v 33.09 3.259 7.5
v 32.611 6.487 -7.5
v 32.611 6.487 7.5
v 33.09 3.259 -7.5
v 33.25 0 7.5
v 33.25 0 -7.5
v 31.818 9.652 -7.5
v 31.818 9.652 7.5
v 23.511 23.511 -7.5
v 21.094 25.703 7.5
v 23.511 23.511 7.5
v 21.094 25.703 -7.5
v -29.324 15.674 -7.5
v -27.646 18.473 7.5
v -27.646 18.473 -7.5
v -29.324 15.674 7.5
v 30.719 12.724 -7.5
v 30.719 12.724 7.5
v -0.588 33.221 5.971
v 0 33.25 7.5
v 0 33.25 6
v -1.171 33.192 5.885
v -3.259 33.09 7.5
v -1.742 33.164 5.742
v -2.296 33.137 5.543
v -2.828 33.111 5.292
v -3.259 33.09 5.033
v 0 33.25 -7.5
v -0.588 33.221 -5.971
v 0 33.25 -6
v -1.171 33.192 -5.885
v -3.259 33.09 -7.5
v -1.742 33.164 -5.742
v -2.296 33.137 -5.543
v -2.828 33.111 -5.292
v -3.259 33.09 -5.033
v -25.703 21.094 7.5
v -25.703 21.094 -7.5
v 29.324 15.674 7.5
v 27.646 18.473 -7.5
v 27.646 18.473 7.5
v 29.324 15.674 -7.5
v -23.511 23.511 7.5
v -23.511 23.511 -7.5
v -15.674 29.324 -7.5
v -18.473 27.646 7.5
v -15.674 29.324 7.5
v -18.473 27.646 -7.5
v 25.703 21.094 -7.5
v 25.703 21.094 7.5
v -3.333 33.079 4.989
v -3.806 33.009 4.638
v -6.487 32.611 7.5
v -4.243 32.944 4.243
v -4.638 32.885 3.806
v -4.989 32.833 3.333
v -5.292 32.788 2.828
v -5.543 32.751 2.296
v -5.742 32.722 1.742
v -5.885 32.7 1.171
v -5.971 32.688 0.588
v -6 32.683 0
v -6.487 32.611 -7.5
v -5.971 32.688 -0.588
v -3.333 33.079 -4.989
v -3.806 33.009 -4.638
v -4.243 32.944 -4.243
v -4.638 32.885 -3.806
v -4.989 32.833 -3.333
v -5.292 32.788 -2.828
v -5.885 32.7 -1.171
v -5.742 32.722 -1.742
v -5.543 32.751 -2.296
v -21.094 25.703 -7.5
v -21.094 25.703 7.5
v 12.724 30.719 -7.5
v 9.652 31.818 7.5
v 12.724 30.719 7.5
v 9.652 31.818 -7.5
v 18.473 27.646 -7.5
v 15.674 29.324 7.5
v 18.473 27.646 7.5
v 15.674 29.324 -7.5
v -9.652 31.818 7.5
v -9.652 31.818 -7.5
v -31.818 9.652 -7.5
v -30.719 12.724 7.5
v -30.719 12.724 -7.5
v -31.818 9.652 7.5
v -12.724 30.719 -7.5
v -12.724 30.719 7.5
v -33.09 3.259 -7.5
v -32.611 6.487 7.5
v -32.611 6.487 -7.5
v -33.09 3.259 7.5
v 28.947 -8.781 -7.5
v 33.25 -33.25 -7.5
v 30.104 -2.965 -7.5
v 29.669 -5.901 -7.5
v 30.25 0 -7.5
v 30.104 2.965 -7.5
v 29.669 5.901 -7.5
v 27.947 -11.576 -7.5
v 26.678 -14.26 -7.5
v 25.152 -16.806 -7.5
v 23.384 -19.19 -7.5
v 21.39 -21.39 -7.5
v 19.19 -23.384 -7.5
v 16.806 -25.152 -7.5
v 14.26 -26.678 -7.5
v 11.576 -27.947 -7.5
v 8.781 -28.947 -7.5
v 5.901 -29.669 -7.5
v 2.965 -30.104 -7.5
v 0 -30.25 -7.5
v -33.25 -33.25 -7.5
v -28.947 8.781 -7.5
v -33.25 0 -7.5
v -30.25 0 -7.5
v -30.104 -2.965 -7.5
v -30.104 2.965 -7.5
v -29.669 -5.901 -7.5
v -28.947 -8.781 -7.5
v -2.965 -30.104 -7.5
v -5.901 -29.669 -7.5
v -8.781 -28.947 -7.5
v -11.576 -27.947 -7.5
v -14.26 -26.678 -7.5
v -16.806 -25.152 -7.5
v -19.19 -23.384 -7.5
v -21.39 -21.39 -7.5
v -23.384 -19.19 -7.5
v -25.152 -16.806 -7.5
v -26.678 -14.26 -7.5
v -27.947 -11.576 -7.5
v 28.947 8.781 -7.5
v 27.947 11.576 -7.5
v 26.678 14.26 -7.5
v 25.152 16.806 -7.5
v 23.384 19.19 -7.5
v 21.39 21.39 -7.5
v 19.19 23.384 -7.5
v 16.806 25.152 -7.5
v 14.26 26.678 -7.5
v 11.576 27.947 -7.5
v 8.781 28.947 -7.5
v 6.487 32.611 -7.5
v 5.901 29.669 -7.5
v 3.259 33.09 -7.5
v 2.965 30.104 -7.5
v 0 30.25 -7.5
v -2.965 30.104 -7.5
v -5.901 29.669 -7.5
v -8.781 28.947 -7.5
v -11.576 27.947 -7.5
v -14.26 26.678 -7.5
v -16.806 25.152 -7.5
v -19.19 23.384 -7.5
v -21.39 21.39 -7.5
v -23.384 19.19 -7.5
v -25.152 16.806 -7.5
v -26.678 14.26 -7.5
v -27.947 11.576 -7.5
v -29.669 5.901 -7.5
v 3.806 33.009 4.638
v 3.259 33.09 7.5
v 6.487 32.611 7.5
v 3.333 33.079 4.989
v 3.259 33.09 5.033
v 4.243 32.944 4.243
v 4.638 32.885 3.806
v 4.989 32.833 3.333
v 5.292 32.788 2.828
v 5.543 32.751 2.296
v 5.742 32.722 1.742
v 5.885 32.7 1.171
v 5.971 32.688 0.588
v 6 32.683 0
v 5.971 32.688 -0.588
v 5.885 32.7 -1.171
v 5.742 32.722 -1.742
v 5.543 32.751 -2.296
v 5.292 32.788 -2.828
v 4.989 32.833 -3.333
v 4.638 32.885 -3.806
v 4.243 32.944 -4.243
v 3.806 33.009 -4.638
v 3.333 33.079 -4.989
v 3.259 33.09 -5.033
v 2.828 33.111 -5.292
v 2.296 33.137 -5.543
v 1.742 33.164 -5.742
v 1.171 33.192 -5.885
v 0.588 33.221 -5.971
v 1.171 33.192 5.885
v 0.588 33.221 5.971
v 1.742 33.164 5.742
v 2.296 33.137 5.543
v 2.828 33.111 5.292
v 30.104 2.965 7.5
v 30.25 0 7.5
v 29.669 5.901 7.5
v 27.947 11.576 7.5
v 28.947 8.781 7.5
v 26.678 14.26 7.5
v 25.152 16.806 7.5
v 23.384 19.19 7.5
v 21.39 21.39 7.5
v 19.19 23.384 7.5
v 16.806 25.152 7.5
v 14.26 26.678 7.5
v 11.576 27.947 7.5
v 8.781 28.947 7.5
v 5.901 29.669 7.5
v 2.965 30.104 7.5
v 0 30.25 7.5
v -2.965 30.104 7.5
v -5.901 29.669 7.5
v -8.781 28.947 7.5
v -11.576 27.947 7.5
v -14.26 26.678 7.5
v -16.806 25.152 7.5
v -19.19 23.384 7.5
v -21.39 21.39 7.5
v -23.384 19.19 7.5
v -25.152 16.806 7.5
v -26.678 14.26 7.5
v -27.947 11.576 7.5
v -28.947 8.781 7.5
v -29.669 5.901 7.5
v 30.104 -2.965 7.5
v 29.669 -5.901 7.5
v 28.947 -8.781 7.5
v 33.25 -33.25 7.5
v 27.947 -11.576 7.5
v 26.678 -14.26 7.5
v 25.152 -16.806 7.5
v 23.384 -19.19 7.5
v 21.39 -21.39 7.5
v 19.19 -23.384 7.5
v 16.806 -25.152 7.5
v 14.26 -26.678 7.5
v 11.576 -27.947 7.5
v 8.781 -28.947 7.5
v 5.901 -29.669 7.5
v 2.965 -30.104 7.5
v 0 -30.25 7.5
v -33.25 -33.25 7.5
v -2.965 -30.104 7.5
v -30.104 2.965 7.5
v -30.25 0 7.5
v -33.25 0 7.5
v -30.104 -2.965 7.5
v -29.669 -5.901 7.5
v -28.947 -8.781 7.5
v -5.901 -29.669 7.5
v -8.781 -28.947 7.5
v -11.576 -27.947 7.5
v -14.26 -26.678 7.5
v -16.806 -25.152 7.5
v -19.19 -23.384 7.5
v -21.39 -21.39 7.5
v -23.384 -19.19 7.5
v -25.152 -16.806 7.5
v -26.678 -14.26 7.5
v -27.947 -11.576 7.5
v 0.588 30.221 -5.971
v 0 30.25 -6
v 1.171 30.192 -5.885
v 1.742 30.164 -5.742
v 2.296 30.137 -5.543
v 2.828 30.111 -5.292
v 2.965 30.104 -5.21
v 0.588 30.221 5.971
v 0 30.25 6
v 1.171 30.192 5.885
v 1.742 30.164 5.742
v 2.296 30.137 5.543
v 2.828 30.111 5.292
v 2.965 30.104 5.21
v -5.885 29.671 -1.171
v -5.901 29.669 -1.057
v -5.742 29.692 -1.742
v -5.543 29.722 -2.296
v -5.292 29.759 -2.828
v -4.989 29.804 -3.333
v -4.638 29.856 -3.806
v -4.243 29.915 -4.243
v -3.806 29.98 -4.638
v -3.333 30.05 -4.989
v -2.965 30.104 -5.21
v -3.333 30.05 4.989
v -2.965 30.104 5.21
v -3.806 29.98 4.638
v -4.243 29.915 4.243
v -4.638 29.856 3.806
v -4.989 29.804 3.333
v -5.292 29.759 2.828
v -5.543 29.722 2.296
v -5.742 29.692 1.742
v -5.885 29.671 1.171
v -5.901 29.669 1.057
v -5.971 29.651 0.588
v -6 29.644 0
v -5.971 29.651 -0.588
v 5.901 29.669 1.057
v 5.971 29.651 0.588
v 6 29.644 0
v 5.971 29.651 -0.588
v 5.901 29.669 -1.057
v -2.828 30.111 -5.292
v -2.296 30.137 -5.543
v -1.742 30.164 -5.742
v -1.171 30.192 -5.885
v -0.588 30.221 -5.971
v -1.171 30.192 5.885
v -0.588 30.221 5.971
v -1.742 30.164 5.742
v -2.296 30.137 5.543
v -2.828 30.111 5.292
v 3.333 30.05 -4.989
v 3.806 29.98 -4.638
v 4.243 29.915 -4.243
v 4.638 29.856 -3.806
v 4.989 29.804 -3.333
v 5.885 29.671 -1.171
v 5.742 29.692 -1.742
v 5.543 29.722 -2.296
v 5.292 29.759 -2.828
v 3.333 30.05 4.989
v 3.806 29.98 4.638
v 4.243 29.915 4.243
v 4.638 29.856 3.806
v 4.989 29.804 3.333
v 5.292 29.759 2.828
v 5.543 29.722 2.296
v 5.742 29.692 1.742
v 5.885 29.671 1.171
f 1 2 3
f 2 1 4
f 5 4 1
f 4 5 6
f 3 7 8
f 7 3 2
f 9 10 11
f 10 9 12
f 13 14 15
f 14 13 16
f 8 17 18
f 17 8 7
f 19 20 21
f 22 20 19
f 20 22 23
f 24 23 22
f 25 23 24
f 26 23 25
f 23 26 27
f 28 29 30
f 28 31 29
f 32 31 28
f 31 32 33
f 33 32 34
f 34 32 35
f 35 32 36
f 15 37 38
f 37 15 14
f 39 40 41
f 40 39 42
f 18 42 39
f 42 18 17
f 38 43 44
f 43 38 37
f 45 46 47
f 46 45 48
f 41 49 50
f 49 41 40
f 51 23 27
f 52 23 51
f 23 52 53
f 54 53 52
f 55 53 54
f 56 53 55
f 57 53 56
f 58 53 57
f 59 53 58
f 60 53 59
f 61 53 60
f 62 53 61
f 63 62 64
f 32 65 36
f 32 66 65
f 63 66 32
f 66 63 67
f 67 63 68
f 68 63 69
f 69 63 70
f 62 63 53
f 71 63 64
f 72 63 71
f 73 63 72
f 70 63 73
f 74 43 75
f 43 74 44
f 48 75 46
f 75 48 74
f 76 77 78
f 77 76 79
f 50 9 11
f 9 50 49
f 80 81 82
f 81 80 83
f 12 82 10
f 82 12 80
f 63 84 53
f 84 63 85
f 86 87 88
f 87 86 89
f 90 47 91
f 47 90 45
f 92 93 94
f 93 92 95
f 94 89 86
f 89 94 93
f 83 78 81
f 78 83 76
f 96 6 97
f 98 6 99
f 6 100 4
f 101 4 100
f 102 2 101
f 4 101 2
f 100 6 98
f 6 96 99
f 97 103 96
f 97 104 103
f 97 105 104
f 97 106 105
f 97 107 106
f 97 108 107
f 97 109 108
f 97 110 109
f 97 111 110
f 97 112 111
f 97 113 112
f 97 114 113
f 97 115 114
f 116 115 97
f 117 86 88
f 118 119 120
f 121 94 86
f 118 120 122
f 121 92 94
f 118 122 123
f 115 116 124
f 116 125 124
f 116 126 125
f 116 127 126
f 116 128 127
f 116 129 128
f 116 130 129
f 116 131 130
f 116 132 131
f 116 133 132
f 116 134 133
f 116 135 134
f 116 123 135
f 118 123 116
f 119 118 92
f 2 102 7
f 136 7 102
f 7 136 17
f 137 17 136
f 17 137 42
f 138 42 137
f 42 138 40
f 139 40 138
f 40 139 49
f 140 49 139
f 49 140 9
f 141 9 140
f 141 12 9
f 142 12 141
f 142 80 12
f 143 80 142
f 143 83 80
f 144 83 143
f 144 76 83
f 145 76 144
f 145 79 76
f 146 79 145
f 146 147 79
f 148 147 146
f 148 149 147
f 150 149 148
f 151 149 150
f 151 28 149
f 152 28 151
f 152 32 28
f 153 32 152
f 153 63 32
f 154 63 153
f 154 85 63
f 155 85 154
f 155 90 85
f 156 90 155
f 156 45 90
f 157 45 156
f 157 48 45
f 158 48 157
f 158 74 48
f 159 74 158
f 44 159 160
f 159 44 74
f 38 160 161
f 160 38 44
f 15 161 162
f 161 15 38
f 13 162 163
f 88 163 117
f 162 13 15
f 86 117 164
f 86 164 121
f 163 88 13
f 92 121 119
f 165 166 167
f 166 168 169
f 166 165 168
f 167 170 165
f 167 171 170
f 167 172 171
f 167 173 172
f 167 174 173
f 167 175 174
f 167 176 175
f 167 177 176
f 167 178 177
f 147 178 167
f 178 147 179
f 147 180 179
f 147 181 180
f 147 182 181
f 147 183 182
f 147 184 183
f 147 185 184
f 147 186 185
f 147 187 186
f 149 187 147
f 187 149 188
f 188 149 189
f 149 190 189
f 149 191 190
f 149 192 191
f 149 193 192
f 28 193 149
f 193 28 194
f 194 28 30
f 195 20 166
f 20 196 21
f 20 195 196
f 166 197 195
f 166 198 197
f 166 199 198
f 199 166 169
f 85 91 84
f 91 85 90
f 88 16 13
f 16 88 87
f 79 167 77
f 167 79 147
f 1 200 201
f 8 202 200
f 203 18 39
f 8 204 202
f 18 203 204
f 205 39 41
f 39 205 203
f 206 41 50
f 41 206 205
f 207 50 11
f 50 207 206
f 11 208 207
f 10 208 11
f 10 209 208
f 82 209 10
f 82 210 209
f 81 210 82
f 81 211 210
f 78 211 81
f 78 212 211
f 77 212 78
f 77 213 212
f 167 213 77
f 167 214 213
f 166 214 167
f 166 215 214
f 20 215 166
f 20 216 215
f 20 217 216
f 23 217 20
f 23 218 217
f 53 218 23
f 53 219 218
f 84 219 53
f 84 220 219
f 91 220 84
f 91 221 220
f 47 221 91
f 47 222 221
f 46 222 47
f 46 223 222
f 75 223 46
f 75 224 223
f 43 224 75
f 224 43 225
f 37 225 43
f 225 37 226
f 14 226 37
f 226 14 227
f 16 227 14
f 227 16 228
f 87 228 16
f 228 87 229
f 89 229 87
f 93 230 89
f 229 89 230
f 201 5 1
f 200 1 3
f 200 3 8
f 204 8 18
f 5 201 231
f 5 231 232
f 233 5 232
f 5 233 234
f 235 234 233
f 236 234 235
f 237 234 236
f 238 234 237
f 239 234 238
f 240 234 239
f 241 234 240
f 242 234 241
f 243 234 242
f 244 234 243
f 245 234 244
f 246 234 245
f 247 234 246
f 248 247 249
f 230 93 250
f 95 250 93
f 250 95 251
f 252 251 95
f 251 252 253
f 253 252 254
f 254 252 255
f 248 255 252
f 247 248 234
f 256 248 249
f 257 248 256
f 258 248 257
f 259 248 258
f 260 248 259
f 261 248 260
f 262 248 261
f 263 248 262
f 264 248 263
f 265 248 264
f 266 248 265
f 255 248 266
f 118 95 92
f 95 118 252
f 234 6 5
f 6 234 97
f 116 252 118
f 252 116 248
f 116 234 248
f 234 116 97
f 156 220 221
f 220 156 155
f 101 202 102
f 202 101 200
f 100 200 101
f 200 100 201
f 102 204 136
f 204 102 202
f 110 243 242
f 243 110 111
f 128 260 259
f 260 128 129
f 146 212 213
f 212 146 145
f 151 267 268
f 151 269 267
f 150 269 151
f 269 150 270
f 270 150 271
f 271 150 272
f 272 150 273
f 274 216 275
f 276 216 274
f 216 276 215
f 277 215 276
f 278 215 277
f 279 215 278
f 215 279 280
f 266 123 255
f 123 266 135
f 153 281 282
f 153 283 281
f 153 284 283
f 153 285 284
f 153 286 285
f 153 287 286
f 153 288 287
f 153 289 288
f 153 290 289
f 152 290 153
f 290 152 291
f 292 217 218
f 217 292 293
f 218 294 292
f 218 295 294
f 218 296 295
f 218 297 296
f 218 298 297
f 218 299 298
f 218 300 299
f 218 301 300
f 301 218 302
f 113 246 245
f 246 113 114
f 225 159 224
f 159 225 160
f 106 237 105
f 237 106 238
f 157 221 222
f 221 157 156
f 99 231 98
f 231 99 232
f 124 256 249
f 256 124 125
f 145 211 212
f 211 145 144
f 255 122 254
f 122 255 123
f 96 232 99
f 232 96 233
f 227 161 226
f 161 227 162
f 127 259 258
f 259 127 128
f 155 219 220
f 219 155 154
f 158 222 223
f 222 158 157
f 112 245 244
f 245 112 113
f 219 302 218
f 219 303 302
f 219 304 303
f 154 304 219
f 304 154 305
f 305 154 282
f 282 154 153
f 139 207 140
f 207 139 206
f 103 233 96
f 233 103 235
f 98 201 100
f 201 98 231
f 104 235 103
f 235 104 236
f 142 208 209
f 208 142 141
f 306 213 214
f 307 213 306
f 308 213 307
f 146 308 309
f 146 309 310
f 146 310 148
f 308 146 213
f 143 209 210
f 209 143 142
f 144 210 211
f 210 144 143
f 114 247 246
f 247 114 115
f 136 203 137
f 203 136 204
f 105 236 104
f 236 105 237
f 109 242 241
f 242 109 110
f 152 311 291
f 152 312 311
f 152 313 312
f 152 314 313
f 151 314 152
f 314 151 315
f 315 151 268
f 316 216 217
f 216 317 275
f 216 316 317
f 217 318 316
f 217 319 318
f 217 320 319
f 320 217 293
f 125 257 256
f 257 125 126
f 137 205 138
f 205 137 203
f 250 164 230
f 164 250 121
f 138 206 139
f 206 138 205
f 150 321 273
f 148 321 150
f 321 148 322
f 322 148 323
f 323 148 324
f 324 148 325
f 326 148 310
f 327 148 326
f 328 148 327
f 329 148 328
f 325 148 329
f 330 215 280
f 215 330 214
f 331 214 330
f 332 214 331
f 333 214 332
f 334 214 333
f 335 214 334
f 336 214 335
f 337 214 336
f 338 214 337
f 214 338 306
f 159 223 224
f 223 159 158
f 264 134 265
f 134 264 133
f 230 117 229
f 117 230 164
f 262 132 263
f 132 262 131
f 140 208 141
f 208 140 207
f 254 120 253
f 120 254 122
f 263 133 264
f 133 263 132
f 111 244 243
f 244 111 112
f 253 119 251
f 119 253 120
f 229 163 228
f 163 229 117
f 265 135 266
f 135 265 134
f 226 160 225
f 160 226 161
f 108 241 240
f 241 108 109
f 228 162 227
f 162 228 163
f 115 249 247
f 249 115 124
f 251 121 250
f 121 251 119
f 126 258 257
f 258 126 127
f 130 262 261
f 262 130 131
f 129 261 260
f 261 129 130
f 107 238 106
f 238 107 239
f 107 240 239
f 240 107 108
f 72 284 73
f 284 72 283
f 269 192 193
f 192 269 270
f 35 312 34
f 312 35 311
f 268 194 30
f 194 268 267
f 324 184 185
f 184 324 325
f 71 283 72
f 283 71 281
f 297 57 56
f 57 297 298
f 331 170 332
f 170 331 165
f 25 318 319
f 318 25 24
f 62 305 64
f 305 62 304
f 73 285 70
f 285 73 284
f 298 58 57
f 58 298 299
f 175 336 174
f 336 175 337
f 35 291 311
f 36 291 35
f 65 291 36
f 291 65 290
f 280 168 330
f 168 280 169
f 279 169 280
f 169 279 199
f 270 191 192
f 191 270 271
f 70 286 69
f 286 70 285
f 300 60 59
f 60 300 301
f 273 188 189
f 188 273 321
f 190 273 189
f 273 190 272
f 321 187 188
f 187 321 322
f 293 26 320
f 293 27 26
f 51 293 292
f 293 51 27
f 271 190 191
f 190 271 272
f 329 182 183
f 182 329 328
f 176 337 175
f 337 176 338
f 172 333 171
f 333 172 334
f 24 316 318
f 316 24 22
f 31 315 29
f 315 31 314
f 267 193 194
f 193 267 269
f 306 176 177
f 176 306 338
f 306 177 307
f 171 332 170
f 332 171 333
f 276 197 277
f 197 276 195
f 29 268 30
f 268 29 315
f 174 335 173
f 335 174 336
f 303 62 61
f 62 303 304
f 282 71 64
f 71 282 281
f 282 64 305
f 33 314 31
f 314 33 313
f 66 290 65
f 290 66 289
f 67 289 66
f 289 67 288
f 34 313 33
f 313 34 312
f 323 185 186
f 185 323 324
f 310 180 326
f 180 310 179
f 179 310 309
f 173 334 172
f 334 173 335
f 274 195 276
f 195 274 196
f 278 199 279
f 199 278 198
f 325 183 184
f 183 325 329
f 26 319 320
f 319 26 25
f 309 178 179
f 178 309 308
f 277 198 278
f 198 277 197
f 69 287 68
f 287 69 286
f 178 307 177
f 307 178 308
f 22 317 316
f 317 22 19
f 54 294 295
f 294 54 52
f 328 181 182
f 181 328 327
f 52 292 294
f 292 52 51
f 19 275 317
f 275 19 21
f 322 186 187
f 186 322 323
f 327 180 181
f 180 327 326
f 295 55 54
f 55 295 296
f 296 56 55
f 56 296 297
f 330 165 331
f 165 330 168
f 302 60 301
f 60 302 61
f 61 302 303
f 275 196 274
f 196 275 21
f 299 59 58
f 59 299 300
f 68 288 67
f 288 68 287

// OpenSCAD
// file: aqara-rim.scad
include <constants.scad>;

module aqara_rim() {
  difference() {
    difference() {
      union() {
        // Основное кольцо обода
        cylinder(h=GLOBAL_HEIGHT, d=AQARA_RIM_OUTER_D, center=true);

        translate([0, -AQARA_RIM_OUTER_D / 4, 0])
          cube([AQARA_RIM_OUTER_D, AQARA_RIM_OUTER_D / 2, GLOBAL_HEIGHT], center=true);
      }

      // Внутреннее отверстие (надевается на розетку)
      translate([0, 0, -2.5])
        cylinder(h=GLOBAL_HEIGHT + 10, d=AQARA_RIM_INNER_D, center=true);
    }
    
    translate([0, AQARA_RIM_OUTER_D / 2, 0])
      rotate([90, 90, 0])
        aqara_button_hole();
  }
}

module aqara_button_hole() {
  difference() {
    union() {
      cylinder(h=GLOBAL_HEIGHT, d=AQARA_BUTTON_DIAMETER, center=true);
    }
  }
}
// file: constants.scad
$fn = 64; // Качество окружностей

GLOBAL_HEIGHT = 15;

// Aqara розетка
AQARA_DIAMETER = 60;
AQARA_BUTTON_DIAMETER = 12;
AQARA_RIM_THICKNESS = 3;
AQARA_RIM_INNER_D = AQARA_DIAMETER + 0.5;
AQARA_RIM_OUTER_D = AQARA_RIM_INNER_D + AQARA_RIM_THICKNESS * 2;

ESP32_WIDTH = 25.4;
ESP32_LENGTH = 53.3;
ESP32_HEIGHT = 13;
// main file
include <constants.scad>;

use <aqara-rim.scad>;

aqara_rim();
//difference() {
//  cube([ESP32_LENGTH, AQARA_RIM_OUTER_D, GLOBAL_HEIGHT], center=true);
//  translate([0, 0, -GLOBAL_HEIGHT / 2])
//    cube([ESP32_LENGTH, ESP32_WIDTH, GLOBAL_HEIGHT], center=true);
//}
